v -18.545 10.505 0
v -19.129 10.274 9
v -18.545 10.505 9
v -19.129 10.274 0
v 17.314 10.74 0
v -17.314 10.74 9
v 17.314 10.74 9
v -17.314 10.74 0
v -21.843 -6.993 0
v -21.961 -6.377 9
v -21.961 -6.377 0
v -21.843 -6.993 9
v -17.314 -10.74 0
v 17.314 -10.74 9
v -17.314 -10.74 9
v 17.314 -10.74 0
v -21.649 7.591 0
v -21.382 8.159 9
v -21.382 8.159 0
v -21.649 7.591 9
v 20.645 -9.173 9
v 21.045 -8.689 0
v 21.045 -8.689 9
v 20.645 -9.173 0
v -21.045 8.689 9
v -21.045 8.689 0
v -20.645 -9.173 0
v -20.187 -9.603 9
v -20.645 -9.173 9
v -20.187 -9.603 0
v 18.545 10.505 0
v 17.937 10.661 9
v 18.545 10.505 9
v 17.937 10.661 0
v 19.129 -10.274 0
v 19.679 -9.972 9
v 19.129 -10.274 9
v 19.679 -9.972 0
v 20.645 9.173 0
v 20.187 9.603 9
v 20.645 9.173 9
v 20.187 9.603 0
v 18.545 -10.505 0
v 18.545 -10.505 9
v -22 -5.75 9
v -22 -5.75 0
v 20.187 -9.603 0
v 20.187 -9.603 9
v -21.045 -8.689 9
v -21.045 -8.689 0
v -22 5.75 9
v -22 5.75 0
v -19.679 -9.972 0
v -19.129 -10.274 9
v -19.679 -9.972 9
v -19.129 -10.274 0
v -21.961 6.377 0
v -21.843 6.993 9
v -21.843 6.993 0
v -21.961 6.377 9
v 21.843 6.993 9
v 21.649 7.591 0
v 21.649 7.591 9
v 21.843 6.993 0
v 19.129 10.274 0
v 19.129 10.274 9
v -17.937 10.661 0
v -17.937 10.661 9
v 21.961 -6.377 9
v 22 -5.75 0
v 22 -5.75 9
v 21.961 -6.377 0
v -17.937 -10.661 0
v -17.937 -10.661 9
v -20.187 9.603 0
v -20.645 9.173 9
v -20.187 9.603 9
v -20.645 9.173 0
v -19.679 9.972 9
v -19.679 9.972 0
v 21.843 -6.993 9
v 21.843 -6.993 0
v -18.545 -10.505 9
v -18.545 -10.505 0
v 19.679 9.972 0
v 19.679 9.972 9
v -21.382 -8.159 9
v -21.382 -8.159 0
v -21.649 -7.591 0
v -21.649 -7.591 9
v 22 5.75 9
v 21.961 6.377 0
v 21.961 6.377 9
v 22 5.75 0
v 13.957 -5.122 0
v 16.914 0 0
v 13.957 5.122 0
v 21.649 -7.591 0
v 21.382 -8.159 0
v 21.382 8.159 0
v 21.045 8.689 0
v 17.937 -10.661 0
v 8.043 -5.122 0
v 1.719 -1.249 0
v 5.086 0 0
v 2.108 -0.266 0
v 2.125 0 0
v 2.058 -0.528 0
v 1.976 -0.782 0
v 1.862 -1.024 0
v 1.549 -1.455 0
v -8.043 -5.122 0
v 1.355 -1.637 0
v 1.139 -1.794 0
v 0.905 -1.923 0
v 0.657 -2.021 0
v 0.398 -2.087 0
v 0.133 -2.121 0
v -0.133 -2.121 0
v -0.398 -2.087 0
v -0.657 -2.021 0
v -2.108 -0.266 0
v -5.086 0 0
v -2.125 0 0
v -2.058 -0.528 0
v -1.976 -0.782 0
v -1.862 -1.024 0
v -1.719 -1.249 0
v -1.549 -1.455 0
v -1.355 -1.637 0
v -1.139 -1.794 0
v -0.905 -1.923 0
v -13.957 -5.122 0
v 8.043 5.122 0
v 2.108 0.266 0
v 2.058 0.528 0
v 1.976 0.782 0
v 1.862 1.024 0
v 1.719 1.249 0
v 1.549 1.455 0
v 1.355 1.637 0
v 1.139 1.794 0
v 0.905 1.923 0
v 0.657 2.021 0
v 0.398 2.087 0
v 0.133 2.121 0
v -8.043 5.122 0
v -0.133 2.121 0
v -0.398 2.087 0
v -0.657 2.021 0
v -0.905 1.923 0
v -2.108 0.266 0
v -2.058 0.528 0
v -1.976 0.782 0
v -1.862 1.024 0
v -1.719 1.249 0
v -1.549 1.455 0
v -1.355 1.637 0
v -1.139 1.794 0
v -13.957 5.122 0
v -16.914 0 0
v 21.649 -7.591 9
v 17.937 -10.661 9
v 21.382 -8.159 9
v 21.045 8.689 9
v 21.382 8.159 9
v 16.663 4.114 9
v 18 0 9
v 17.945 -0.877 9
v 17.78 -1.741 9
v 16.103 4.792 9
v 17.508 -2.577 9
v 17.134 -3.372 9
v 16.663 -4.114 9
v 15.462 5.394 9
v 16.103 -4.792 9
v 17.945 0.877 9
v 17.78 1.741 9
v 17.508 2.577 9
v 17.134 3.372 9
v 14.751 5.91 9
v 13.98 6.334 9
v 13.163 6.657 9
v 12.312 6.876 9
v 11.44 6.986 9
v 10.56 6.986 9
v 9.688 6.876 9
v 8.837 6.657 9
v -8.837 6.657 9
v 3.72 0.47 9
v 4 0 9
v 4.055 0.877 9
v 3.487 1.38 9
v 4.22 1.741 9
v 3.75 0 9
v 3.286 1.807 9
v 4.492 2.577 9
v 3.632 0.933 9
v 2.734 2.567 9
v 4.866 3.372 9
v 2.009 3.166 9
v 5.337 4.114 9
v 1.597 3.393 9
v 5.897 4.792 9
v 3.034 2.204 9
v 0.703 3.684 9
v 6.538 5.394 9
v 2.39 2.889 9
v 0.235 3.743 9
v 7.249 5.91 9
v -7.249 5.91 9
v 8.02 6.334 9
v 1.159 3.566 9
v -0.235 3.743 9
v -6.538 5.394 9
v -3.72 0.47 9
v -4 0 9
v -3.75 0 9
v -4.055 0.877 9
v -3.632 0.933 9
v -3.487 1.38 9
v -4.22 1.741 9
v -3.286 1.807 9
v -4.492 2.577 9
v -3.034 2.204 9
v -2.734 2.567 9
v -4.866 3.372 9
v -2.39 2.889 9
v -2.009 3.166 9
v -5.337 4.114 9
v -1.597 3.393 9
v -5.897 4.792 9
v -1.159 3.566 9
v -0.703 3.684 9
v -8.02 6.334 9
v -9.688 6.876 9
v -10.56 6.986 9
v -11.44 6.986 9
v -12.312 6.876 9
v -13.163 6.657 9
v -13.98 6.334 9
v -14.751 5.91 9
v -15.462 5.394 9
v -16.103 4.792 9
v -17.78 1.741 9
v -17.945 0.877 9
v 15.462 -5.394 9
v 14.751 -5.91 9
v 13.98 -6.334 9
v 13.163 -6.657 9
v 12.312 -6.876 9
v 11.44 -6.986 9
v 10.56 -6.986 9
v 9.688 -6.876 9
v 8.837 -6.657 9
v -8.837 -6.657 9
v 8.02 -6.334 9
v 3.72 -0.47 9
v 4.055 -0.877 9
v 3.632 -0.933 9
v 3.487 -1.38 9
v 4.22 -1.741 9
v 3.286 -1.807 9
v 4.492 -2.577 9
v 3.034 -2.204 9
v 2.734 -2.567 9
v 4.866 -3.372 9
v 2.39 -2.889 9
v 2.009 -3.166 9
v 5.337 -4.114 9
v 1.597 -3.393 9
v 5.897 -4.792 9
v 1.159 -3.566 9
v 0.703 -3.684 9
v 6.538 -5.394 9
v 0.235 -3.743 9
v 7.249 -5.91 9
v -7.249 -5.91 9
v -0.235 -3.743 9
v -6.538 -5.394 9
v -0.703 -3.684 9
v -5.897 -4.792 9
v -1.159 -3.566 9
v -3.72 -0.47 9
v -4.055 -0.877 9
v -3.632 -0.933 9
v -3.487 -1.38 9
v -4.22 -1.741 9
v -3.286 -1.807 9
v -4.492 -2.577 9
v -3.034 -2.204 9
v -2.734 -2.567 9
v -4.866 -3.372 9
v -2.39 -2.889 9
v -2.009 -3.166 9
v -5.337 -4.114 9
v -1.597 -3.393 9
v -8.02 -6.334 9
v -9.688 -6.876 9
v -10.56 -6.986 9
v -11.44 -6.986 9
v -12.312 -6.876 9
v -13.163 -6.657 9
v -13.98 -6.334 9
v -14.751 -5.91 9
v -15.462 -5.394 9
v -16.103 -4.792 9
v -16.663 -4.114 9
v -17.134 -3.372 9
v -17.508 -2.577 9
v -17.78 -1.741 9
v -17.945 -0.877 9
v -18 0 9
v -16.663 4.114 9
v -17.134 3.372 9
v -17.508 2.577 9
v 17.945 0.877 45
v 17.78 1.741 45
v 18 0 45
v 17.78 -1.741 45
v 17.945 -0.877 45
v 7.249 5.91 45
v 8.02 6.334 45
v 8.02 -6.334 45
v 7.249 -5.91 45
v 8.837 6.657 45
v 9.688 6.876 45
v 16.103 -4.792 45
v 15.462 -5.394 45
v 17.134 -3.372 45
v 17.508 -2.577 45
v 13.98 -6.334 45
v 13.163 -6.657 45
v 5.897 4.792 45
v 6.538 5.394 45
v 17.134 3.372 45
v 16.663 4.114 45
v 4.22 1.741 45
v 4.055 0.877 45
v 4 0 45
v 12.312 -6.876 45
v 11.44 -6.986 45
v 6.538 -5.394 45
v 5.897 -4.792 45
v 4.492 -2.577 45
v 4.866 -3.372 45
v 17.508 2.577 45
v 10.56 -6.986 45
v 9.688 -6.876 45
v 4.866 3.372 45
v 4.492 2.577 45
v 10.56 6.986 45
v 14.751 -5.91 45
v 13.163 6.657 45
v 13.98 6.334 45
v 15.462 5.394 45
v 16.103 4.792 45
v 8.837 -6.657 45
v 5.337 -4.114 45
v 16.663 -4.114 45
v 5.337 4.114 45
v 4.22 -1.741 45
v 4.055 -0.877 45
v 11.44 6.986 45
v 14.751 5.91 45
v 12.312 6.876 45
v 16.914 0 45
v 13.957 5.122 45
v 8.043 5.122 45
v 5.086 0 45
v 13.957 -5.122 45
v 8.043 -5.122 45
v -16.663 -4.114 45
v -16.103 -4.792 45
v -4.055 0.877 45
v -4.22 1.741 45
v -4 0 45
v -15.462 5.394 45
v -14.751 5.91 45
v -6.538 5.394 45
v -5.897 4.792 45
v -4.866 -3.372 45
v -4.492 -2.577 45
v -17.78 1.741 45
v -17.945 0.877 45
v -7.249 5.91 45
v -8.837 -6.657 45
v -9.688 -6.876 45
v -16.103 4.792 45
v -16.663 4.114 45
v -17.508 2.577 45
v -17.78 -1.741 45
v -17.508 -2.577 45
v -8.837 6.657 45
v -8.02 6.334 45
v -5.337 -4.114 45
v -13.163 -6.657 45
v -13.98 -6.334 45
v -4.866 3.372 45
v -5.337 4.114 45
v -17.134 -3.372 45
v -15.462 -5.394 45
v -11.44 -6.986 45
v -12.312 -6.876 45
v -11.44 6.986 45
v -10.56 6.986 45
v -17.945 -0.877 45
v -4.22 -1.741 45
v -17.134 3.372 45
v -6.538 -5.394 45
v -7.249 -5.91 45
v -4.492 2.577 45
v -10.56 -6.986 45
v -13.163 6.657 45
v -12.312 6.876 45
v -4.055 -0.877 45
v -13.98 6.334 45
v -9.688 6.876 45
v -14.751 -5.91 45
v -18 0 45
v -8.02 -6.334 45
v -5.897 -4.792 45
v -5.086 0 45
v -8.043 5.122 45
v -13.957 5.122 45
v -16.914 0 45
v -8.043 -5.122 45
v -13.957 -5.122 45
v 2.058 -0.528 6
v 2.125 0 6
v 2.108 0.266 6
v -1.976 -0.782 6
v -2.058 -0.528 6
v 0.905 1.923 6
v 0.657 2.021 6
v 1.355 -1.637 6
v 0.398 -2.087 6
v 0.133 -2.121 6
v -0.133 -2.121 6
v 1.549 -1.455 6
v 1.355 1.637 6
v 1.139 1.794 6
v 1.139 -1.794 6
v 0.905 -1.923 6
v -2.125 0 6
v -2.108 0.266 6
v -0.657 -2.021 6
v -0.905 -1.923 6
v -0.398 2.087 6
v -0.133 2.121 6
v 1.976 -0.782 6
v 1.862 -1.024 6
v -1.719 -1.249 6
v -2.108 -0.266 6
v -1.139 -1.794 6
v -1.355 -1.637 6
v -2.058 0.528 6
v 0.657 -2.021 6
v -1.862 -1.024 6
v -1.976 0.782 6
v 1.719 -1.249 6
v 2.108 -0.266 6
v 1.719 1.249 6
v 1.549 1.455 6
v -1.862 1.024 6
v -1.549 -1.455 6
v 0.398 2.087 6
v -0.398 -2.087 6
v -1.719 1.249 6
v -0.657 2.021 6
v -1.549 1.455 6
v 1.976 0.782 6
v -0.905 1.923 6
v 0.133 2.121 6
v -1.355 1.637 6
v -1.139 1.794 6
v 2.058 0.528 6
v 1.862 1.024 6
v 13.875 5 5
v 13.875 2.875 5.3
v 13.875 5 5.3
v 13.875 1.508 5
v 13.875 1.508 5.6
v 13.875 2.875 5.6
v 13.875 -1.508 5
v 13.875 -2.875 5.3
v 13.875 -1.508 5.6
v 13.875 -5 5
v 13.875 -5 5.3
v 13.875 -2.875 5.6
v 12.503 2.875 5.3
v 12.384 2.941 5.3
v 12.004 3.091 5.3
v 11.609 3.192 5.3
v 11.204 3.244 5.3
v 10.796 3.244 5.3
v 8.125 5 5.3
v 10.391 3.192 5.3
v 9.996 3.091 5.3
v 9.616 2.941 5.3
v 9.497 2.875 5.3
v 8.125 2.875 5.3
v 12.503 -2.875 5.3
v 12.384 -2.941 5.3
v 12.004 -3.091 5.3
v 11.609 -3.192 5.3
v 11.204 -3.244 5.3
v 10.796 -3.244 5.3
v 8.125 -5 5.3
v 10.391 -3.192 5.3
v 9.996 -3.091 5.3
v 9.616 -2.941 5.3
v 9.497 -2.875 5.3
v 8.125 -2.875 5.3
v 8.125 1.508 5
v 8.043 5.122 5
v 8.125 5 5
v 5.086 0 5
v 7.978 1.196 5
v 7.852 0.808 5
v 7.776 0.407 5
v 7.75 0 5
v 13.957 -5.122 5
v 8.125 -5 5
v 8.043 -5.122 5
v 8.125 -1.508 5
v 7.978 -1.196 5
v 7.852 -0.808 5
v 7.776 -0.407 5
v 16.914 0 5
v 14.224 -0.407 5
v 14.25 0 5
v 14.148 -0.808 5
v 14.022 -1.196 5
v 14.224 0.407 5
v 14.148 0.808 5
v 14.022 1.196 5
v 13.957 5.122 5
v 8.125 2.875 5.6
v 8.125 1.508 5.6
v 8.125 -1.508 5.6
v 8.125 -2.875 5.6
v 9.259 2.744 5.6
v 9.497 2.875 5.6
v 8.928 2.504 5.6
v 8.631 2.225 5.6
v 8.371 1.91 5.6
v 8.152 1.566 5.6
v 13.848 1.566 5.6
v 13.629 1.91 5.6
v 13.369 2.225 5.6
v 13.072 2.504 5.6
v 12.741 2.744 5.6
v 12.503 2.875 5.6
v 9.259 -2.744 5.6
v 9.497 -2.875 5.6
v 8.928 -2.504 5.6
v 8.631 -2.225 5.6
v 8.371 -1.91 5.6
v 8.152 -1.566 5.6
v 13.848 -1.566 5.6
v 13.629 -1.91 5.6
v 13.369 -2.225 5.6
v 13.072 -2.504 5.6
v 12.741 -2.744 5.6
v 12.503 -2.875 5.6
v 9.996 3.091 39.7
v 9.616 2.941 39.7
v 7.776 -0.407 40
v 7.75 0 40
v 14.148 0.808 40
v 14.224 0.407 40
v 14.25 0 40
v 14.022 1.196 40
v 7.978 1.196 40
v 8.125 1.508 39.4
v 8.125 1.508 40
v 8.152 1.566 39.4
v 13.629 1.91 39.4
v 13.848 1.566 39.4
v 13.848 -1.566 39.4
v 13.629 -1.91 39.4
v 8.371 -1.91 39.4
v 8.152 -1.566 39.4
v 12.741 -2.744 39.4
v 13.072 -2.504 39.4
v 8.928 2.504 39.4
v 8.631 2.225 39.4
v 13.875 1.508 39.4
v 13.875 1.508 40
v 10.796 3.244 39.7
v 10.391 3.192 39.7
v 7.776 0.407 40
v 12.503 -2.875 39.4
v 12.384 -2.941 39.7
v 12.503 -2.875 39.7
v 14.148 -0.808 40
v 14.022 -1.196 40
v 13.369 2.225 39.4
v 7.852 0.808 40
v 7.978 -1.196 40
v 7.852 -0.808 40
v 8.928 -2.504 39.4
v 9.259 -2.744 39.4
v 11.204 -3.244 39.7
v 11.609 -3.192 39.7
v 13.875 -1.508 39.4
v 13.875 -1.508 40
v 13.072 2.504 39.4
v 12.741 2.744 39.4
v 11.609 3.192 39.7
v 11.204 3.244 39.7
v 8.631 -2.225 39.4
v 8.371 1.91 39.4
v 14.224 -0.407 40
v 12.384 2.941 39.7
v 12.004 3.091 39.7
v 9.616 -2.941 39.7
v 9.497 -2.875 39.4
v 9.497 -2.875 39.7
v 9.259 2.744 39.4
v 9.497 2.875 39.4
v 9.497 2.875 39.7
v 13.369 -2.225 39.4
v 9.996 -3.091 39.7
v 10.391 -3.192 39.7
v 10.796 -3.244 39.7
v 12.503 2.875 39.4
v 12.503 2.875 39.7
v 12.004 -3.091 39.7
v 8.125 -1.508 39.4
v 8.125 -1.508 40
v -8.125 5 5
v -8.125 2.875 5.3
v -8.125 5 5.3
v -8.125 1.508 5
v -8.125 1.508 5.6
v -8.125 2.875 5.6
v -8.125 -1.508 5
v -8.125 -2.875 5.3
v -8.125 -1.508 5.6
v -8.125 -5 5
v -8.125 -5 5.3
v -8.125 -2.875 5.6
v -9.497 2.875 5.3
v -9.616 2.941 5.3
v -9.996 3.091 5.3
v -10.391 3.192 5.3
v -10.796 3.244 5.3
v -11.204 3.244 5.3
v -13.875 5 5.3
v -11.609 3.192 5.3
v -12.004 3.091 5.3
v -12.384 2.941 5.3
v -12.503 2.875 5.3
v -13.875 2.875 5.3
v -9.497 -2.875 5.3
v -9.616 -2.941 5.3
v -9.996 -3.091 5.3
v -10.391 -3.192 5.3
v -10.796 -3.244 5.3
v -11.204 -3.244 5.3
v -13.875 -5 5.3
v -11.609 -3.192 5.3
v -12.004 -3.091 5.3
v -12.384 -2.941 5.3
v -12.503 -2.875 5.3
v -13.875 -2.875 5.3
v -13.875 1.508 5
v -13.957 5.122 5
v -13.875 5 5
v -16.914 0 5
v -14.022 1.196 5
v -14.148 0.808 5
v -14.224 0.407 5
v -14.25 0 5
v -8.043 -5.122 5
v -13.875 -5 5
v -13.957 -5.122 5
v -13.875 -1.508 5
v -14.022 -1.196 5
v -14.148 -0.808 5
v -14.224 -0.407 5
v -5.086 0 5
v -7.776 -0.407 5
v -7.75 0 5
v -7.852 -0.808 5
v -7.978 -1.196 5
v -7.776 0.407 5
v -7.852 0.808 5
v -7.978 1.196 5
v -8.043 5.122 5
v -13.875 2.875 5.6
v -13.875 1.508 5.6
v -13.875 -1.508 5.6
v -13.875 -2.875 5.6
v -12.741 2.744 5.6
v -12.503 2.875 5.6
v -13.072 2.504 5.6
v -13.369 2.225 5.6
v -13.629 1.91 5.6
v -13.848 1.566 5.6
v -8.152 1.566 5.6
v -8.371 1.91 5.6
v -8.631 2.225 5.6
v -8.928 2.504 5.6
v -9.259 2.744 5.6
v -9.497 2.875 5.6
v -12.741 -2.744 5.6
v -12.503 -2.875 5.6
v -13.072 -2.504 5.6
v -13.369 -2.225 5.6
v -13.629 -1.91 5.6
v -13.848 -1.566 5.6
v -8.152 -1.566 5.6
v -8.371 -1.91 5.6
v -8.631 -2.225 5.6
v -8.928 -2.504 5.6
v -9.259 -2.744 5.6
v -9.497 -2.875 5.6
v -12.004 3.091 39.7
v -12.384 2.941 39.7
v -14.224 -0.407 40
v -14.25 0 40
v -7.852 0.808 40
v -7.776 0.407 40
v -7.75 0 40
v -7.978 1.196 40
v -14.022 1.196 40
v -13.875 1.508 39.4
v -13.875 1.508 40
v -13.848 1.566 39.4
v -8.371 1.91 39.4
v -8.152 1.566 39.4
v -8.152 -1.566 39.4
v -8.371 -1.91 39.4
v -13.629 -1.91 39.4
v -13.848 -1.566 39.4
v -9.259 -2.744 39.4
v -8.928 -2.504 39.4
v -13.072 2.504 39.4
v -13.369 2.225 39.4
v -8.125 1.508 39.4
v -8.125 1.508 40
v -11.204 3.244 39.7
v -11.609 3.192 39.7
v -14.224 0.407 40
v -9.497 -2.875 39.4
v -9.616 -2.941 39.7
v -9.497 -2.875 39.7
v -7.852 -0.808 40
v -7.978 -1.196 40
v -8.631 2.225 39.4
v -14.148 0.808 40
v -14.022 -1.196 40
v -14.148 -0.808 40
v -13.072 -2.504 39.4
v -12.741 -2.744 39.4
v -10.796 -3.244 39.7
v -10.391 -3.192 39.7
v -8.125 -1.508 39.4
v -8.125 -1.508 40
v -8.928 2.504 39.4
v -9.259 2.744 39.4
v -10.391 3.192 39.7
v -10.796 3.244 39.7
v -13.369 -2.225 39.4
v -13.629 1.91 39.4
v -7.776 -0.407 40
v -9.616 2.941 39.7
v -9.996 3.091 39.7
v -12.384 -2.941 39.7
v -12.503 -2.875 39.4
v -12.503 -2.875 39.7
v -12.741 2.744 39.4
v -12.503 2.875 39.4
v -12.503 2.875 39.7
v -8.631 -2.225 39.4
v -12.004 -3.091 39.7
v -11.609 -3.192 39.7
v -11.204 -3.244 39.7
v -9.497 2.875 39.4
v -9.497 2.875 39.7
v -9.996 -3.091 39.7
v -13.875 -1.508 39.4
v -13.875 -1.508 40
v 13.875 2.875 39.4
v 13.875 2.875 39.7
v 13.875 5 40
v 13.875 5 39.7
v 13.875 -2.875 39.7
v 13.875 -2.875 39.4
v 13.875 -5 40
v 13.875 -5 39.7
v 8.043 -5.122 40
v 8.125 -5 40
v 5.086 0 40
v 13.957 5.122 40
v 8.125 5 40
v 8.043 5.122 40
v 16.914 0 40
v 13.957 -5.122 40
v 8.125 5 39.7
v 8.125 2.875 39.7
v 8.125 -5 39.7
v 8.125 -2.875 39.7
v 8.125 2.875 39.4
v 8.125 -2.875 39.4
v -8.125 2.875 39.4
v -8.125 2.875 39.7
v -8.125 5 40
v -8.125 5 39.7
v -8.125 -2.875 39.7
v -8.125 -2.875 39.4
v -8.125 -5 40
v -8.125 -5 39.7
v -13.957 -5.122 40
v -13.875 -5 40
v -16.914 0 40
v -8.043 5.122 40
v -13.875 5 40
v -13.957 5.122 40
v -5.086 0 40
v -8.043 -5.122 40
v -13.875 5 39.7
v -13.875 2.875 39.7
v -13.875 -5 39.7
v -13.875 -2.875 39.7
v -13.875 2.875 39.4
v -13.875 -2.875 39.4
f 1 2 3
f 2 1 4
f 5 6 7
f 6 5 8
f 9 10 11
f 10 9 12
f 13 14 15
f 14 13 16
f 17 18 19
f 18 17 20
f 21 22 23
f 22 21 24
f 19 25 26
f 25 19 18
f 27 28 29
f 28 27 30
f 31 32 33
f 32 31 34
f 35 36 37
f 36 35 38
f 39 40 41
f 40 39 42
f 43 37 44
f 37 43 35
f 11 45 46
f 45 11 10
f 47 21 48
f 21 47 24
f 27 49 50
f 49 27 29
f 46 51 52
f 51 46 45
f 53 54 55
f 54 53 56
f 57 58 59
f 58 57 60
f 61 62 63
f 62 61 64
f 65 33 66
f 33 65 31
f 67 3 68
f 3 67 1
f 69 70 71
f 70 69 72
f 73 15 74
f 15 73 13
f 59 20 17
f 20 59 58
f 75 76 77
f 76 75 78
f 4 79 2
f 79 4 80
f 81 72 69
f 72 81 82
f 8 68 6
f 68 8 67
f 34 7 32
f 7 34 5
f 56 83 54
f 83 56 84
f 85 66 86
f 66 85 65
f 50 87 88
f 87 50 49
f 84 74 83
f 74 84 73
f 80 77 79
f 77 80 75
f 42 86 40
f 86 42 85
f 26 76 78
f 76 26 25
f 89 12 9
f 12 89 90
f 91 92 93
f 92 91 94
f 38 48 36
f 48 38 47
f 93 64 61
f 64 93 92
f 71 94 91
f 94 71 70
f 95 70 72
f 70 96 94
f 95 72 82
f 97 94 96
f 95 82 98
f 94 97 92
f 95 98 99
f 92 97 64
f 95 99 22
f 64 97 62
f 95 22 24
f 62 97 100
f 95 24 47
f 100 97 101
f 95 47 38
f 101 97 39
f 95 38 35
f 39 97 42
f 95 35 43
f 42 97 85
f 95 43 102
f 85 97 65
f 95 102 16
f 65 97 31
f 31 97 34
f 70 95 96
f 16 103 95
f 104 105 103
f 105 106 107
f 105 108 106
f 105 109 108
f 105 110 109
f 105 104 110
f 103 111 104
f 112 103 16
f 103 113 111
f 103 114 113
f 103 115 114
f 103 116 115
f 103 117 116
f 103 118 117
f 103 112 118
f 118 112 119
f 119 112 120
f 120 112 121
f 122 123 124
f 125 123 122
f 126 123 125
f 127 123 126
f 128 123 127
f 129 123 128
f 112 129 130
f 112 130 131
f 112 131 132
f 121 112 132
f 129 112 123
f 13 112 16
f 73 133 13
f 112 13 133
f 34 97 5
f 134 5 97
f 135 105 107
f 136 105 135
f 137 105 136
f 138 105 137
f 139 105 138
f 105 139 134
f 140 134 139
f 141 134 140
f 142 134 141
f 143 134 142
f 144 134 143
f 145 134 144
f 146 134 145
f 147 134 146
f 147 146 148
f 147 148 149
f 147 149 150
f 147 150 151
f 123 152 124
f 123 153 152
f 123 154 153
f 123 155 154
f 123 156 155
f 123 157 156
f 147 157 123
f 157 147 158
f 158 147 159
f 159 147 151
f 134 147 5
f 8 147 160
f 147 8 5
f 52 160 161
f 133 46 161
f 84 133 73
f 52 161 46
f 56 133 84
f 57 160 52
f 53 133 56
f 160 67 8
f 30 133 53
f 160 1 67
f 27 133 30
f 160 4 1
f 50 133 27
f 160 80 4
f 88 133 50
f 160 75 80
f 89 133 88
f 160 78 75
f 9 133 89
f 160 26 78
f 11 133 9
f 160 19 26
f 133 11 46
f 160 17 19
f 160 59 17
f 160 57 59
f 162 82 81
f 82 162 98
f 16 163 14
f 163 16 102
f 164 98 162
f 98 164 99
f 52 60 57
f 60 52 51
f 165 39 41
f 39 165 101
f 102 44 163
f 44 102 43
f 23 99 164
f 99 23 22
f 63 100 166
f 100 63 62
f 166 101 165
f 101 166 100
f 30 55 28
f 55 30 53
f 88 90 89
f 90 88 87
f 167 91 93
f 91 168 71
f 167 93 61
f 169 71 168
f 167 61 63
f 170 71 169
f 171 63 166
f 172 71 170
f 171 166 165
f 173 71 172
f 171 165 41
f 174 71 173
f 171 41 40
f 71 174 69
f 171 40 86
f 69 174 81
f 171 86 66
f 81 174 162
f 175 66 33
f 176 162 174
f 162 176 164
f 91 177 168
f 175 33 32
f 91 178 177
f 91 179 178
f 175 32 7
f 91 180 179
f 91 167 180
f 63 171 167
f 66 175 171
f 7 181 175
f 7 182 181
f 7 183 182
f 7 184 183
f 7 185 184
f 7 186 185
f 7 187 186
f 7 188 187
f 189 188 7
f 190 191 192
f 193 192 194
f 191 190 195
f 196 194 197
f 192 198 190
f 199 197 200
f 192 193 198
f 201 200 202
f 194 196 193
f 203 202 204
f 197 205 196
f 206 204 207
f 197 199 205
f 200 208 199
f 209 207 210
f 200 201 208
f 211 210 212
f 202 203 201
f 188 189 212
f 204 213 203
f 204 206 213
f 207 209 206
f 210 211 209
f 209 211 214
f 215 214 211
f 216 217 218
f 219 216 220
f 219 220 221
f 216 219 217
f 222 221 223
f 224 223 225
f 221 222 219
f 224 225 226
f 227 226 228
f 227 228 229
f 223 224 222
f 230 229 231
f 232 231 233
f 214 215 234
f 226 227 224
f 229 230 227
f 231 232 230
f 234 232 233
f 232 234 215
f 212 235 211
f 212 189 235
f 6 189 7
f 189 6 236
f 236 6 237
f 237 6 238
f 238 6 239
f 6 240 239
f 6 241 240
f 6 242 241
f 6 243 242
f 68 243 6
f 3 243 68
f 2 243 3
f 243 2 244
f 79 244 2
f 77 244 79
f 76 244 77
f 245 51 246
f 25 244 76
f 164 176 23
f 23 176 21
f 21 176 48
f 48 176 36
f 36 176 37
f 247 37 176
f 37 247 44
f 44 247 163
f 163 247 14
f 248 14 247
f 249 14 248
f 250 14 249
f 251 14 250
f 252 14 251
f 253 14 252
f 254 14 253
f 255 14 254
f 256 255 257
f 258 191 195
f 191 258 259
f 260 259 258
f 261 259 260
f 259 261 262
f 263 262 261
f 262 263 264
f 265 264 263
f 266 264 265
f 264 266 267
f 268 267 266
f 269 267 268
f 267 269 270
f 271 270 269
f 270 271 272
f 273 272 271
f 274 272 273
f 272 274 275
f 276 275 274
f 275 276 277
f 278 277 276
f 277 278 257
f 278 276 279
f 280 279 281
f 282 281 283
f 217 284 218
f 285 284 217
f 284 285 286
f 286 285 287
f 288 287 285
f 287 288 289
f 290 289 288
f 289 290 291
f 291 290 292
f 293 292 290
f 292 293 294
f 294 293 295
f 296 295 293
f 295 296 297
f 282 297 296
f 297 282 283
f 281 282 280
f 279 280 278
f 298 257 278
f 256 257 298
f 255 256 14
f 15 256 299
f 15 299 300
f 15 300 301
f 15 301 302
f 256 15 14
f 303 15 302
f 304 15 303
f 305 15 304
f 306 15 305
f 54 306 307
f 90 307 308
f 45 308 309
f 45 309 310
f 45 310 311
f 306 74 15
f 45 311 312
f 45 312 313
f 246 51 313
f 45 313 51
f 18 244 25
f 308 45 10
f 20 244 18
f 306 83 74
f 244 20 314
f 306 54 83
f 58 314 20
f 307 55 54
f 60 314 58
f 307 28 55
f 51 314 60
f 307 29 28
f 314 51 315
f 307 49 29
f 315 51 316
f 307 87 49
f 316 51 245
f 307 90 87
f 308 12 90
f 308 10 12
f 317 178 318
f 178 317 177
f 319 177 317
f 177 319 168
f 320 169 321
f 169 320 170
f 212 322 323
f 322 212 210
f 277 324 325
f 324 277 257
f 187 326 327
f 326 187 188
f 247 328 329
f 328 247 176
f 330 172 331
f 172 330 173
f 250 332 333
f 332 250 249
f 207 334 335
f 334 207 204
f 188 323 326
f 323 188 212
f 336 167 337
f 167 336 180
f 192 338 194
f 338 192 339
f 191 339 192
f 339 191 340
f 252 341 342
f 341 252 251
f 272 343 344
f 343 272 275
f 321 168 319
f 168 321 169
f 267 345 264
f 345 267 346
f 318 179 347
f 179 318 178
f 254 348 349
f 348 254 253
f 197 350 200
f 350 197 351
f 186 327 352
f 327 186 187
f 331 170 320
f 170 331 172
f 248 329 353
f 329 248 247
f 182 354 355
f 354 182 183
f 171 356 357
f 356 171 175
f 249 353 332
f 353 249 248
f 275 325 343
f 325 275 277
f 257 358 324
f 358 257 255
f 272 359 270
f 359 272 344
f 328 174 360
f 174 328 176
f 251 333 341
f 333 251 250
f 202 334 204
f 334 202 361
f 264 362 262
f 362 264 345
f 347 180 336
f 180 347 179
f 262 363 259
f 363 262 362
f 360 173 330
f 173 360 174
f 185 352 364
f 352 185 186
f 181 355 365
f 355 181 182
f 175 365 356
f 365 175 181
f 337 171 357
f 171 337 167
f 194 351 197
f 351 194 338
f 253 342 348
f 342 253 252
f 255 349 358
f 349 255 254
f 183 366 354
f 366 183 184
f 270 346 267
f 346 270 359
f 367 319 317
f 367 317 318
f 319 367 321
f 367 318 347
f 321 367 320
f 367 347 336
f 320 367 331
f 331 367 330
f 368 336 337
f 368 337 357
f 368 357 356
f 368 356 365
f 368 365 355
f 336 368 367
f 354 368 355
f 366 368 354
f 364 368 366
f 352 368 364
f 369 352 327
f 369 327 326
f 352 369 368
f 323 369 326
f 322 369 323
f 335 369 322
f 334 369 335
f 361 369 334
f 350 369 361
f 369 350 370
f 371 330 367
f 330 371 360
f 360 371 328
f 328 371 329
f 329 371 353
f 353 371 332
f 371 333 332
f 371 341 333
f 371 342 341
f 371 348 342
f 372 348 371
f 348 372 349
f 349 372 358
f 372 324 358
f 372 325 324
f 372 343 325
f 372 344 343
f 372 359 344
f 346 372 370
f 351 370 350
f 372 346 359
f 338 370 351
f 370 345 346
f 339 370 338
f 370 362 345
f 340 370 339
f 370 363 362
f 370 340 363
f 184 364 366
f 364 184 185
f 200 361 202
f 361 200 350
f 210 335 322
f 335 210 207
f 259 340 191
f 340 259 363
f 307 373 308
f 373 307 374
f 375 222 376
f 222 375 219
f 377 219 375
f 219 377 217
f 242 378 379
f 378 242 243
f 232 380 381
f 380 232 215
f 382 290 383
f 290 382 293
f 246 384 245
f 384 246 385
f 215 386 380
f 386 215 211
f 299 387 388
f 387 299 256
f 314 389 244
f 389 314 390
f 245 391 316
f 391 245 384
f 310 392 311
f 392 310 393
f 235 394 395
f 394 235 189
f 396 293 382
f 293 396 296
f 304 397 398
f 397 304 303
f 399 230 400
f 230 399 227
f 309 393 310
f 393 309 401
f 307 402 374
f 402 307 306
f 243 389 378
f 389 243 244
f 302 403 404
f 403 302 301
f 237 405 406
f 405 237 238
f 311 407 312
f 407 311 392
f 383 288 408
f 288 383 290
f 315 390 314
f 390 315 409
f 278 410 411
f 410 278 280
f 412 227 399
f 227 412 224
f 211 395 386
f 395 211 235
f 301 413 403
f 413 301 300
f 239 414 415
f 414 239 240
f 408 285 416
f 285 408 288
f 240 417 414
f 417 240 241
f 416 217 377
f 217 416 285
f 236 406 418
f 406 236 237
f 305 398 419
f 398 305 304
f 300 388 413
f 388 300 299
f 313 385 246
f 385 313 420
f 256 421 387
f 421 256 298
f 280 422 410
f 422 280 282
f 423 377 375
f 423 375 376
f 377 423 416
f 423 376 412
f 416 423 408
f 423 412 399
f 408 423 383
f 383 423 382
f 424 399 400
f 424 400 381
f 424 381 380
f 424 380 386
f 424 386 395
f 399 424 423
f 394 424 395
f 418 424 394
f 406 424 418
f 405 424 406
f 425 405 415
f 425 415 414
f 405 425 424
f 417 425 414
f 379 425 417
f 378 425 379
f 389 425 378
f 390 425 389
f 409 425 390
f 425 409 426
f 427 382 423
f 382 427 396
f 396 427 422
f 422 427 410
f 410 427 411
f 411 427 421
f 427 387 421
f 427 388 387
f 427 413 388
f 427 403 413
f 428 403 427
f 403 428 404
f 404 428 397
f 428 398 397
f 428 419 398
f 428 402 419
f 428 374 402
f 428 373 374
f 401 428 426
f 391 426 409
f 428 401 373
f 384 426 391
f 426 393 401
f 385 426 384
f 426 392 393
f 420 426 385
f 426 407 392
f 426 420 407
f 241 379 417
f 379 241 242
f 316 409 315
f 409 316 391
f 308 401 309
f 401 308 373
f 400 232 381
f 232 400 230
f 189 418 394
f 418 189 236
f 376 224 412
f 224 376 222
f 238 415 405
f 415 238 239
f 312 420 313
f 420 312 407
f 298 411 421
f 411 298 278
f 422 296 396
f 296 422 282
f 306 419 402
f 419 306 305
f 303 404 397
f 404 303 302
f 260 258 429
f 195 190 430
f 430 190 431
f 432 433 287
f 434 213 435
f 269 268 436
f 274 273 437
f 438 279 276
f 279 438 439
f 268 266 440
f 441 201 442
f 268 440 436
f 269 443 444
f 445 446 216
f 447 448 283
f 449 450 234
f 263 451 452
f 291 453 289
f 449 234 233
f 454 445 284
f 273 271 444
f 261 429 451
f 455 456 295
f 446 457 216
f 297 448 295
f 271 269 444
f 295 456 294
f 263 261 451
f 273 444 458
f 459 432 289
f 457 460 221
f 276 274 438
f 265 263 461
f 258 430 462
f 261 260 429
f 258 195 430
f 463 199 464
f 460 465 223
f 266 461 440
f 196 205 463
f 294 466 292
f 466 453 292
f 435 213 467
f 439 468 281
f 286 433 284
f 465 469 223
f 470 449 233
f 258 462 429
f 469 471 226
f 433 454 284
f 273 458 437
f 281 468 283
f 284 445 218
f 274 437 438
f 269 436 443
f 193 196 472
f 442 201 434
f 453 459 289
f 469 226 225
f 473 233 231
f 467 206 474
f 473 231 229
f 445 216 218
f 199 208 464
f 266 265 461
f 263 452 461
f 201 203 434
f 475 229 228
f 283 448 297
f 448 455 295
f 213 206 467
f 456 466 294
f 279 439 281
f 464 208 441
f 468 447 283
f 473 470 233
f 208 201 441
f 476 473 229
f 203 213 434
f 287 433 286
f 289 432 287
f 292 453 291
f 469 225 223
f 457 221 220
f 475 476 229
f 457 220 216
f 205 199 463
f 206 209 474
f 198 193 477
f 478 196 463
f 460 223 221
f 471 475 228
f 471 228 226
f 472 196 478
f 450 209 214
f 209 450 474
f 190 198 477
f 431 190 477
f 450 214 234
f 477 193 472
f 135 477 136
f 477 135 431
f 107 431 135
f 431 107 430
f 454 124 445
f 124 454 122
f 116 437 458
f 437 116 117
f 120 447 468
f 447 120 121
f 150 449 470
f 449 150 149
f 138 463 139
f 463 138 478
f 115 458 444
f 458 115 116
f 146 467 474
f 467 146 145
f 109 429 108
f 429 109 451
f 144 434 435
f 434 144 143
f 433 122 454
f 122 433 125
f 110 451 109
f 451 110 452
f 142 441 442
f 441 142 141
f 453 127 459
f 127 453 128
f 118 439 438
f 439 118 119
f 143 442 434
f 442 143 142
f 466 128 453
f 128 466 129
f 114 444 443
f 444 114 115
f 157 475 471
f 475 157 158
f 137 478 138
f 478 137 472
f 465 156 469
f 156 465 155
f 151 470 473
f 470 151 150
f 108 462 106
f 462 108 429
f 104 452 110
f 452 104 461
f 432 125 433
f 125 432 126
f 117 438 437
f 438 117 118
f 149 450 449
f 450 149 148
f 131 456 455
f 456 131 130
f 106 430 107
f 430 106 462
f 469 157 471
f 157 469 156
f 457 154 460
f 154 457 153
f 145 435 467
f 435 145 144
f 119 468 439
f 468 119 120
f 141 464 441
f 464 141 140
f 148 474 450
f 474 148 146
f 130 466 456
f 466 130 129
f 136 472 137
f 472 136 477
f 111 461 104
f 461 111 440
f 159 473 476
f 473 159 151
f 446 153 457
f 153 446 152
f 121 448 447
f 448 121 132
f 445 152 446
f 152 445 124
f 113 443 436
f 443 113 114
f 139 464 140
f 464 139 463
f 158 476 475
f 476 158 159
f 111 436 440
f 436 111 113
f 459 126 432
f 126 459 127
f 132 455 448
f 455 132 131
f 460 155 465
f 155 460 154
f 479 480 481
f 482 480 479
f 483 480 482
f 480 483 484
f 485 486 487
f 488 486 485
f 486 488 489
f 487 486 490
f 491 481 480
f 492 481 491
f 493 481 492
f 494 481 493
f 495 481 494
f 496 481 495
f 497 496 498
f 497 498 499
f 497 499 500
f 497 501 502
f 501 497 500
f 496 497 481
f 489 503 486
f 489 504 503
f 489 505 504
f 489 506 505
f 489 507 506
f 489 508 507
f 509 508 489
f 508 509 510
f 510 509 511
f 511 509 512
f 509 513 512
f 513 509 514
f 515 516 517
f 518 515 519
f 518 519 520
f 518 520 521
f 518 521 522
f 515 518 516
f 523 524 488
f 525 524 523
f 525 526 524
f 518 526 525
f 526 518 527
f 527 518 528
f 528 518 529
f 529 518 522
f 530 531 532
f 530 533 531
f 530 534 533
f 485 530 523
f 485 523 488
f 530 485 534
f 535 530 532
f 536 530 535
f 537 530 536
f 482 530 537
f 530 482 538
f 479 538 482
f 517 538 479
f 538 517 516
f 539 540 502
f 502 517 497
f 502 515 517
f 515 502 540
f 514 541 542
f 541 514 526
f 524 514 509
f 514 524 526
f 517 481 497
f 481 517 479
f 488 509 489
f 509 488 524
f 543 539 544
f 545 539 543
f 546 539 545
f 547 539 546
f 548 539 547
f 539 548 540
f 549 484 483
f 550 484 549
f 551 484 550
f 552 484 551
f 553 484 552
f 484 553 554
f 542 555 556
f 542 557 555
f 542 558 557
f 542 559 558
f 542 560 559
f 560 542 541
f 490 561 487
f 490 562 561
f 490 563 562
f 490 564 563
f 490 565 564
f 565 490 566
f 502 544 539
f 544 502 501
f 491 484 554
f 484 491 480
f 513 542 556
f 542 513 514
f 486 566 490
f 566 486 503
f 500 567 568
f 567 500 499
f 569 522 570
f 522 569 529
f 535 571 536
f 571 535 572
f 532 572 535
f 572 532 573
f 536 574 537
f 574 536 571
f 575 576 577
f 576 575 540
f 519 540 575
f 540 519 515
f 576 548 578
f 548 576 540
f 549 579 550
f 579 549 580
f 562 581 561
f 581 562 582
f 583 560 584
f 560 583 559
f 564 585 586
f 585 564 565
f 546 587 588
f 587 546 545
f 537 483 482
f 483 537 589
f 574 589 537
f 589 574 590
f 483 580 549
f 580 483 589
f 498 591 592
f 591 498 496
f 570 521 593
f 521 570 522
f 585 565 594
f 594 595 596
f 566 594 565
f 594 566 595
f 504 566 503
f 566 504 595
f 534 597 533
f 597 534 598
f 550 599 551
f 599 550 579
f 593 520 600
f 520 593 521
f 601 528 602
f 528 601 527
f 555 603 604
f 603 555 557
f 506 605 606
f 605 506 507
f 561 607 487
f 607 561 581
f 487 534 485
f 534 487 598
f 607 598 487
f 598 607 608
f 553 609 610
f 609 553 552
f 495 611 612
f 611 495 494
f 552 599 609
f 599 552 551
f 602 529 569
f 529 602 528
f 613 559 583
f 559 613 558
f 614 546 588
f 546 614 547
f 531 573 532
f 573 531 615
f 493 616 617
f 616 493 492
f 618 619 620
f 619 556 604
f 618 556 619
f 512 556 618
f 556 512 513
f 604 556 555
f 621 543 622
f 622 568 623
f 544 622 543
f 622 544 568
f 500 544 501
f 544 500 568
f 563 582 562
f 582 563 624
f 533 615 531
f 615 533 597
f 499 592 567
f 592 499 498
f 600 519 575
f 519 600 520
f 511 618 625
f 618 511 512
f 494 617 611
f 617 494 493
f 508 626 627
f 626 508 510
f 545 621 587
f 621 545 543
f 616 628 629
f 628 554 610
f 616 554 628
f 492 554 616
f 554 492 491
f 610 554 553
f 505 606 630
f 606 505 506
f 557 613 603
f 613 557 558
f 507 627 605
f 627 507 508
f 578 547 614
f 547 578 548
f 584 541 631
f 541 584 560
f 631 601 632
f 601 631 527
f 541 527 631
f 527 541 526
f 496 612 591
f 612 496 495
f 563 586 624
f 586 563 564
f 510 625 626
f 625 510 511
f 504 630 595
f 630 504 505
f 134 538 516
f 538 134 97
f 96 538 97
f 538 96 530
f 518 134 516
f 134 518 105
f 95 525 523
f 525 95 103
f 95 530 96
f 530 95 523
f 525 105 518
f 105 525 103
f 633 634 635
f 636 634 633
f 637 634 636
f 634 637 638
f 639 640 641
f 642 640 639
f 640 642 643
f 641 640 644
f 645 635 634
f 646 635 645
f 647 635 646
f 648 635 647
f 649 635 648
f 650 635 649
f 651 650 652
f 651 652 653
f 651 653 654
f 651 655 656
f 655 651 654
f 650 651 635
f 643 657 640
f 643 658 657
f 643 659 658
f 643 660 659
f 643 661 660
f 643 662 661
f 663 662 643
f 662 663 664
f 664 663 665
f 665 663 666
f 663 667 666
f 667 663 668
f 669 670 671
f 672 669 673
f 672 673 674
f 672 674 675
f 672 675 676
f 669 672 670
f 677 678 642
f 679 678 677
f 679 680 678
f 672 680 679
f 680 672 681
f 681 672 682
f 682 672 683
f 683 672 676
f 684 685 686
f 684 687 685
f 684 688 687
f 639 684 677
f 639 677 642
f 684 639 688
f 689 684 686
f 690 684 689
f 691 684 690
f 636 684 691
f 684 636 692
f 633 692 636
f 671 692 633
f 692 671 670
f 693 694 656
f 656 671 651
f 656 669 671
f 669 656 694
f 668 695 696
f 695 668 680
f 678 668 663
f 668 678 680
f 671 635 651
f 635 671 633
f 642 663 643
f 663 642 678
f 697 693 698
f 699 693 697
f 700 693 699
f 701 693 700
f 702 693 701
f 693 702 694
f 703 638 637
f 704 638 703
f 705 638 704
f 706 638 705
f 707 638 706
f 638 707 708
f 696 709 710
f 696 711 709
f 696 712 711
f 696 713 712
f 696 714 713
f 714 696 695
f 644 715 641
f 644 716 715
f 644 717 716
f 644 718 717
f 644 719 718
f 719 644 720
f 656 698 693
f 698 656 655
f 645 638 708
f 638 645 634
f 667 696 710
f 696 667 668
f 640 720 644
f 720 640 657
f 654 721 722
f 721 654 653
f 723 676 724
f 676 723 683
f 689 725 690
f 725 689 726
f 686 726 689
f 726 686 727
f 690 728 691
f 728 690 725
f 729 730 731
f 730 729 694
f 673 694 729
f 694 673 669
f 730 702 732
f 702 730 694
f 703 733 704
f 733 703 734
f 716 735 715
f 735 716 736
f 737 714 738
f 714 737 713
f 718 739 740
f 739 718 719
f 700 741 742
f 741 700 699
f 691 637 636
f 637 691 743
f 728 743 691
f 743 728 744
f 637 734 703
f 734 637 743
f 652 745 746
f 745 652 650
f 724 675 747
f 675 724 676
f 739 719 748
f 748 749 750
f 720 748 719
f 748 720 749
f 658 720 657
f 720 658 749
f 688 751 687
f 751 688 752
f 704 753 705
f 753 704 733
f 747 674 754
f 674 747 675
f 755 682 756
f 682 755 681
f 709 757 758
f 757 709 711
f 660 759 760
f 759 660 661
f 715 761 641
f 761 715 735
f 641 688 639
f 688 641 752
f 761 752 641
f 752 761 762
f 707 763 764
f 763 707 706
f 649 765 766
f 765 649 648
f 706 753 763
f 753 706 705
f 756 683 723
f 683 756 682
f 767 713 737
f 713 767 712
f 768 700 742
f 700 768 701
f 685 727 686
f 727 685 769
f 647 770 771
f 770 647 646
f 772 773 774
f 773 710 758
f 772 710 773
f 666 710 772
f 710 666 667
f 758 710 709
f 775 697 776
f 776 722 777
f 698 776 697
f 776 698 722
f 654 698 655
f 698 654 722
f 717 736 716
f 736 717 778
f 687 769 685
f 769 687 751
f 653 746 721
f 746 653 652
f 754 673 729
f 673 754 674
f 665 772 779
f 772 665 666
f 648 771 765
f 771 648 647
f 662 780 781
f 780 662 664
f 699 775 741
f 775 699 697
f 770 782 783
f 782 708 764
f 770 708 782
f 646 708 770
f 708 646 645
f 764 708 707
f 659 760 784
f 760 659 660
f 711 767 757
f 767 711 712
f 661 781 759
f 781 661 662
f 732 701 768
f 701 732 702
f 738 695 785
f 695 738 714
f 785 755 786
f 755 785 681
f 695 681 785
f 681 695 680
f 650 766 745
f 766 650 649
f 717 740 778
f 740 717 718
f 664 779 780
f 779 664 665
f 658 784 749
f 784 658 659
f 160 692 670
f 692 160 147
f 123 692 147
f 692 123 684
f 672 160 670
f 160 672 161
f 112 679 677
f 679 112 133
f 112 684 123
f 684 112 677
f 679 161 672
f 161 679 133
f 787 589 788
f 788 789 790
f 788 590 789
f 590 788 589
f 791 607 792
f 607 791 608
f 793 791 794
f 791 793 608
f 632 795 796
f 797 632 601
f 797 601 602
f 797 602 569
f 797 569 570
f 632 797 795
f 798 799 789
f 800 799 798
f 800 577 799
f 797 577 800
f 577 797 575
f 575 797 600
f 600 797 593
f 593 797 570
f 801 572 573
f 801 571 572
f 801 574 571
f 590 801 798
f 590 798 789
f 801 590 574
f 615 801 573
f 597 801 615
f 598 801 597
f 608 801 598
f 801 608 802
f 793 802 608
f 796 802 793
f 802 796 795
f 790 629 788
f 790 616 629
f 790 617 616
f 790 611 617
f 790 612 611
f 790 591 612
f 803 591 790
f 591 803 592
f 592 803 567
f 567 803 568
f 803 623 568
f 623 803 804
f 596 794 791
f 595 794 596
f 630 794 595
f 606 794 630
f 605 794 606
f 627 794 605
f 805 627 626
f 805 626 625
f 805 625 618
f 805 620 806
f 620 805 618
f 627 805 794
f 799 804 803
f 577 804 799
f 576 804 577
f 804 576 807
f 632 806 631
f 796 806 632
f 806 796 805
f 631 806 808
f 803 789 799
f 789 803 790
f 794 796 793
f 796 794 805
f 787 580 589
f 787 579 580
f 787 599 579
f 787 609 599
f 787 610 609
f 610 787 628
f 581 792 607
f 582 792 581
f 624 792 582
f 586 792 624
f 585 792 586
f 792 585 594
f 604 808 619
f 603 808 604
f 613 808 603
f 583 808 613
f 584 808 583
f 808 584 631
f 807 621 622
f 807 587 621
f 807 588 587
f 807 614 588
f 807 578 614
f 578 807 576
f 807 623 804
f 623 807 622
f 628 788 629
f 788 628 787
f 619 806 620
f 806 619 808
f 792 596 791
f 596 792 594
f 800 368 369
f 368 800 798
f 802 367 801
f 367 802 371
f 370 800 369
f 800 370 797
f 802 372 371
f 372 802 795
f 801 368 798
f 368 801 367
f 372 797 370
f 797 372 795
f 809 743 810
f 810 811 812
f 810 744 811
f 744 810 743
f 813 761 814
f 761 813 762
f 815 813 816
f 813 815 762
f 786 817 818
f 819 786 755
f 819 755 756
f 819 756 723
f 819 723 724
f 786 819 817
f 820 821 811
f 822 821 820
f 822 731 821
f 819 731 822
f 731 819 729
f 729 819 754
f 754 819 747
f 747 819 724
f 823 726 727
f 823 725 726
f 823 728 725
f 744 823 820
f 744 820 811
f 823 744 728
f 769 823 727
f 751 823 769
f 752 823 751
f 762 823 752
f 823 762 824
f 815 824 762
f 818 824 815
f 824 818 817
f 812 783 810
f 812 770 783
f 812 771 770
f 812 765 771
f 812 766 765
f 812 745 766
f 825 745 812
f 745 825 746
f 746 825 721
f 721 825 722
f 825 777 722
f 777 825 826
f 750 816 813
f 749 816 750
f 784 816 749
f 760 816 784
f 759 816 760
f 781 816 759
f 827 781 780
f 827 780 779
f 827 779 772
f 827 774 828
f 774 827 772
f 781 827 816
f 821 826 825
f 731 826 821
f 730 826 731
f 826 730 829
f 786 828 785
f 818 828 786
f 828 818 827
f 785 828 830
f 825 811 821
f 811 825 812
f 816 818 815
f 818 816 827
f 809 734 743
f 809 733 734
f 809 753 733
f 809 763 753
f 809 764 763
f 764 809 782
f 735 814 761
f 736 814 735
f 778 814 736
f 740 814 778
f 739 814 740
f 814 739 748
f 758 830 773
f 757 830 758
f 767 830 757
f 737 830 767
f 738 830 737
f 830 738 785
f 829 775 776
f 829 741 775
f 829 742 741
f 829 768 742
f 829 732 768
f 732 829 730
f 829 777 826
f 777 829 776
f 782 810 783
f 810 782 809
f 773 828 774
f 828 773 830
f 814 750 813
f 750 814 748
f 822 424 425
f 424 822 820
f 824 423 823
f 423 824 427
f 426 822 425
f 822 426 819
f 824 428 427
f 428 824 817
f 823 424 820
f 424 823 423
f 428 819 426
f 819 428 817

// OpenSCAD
$fn = 50;


difference() {
	union() {
		hull() {
			translate(v = [-17.0000000000, 5.7500000000, 0]) {
				cylinder(h = 9, r = 5);
			}
			translate(v = [17.0000000000, 5.7500000000, 0]) {
				cylinder(h = 9, r = 5);
			}
			translate(v = [-17.0000000000, -5.7500000000, 0]) {
				cylinder(h = 9, r = 5);
			}
			translate(v = [17.0000000000, -5.7500000000, 0]) {
				cylinder(h = 9, r = 5);
			}
		}
		translate(v = [11.0000000000, 0, 0.0000000000]) {
			cylinder(h = 45, r = 7.0000000000);
		}
		translate(v = [-11.0000000000, 0, 0.0000000000]) {
			cylinder(h = 45, r = 7.0000000000);
		}
	}
	union() {
		translate(v = [0, 0, 9]) {
			rotate(a = [0, 0, 0]) {
				difference() {
					union() {
						#translate(v = [0, 0, -40.0000000000]) {
							cylinder(h = 40, r = 2.0000000000);
						}
						#translate(v = [0, 0, -3]) {
							cylinder(h = 3, r1 = 2.1250000000, r2 = 3.7500000000);
						}
						#translate(v = [0, 0, -40.0000000000]) {
							cylinder(h = 40, r = 2.1250000000);
						}
						#translate(v = [0, 0, -40.0000000000]) {
							cylinder(h = 40, r = 2.0000000000);
						}
					}
					union();
				}
			}
		}
		translate(v = [11.0000000000, 0, 0]) {
			rotate(a = [0, 0, 0]) {
				difference() {
					union() {
						#translate(v = [-2.8750000000, -5.0000000000, -0.3000000000]) {
							cube(size = [5.7500000000, 10, 0.3000000000]);
						}
						#translate(v = [-2.8750000000, -2.8750000000, -0.6000000000]) {
							cube(size = [5.7500000000, 5.7500000000, 0.3000000000]);
						}
						#translate(v = [-2.8750000000, -5.0000000000, 5]) {
							cube(size = [5.7500000000, 10, 0.3000000000]);
						}
						#translate(v = [-2.8750000000, -2.8750000000, 5.3000000000]) {
							cube(size = [5.7500000000, 5.7500000000, 0.3000000000]);
						}
						#translate(v = [0, 0, -100.0000000000]) {
							cylinder(h = 200, r = 3.2500000000);
						}
						#linear_extrude(height = 5) {
							polygon(points = [[5.9142500000, 0.0000000000], [2.9571250000, 5.1218907443], [-2.9571250000, 5.1218907443], [-5.9142500000, 0.0000000000], [-2.9571250000, -5.1218907443], [2.9571250000, -5.1218907443]]);
						}
						#translate(v = [-2.8750000000, -5.0000000000, -0.3000000000]) {
							cube(size = [5.7500000000, 10, 0.3000000000]);
						}
						#translate(v = [-2.8750000000, -2.8750000000, -0.6000000000]) {
							cube(size = [5.7500000000, 5.7500000000, 0.3000000000]);
						}
						#translate(v = [-2.8750000000, -5.0000000000, 5]) {
							cube(size = [5.7500000000, 10, 0.3000000000]);
						}
						#translate(v = [-2.8750000000, -2.8750000000, 5.3000000000]) {
							cube(size = [5.7500000000, 5.7500000000, 0.3000000000]);
						}
						#translate(v = [0, 0, -100.0000000000]) {
							cylinder(h = 200, r = 3.2500000000);
						}
						#translate(v = [-2.8750000000, -5.0000000000, -0.3000000000]) {
							cube(size = [5.7500000000, 10, 0.3000000000]);
						}
						#translate(v = [-2.8750000000, -2.8750000000, -0.6000000000]) {
							cube(size = [5.7500000000, 5.7500000000, 0.3000000000]);
						}
						#translate(v = [-2.8750000000, -5.0000000000, 5]) {
							cube(size = [5.7500000000, 10, 0.3000000000]);
						}
						#translate(v = [-2.8750000000, -2.8750000000, 5.3000000000]) {
							cube(size = [5.7500000000, 5.7500000000, 0.3000000000]);
						}
						#translate(v = [0, 0, -100.0000000000]) {
							cylinder(h = 200, r = 3.2500000000);
						}
					}
					union();
				}
			}
		}
		translate(v = [-11.0000000000, 0, 0]) {
			rotate(a = [0, 0, 0]) {
				difference() {
					union() {
						#translate(v = [-2.8750000000, -5.0000000000, -0.3000000000]) {
							cube(size = [5.7500000000, 10, 0.3000000000]);
						}
						#translate(v = [-2.8750000000, -2.8750000000, -0.6000000000]) {
							cube(size = [5.7500000000, 5.7500000000, 0.3000000000]);
						}
						#translate(v = [-2.8750000000, -5.0000000000, 5]) {
							cube(size = [5.7500000000, 10, 0.3000000000]);
						}
						#translate(v = [-2.8750000000, -2.8750000000, 5.3000000000]) {
							cube(size = [5.7500000000, 5.7500000000, 0.3000000000]);
						}
						#translate(v = [0, 0, -100.0000000000]) {
							cylinder(h = 200, r = 3.2500000000);
						}
						#linear_extrude(height = 5) {
							polygon(points = [[5.9142500000, 0.0000000000], [2.9571250000, 5.1218907443], [-2.9571250000, 5.1218907443], [-5.9142500000, 0.0000000000], [-2.9571250000, -5.1218907443], [2.9571250000, -5.1218907443]]);
						}
						#translate(v = [-2.8750000000, -5.0000000000, -0.3000000000]) {
							cube(size = [5.7500000000, 10, 0.3000000000]);
						}
						#translate(v = [-2.8750000000, -2.8750000000, -0.6000000000]) {
							cube(size = [5.7500000000, 5.7500000000, 0.3000000000]);
						}
						#translate(v = [-2.8750000000, -5.0000000000, 5]) {
							cube(size = [5.7500000000, 10, 0.3000000000]);
						}
						#translate(v = [-2.8750000000, -2.8750000000, 5.3000000000]) {
							cube(size = [5.7500000000, 5.7500000000, 0.3000000000]);
						}
						#translate(v = [0, 0, -100.0000000000]) {
							cylinder(h = 200, r = 3.2500000000);
						}
						#translate(v = [-2.8750000000, -5.0000000000, -0.3000000000]) {
							cube(size = [5.7500000000, 10, 0.3000000000]);
						}
						#translate(v = [-2.8750000000, -2.8750000000, -0.6000000000]) {
							cube(size = [5.7500000000, 5.7500000000, 0.3000000000]);
						}
						#translate(v = [-2.8750000000, -5.0000000000, 5]) {
							cube(size = [5.7500000000, 10, 0.3000000000]);
						}
						#translate(v = [-2.8750000000, -2.8750000000, 5.3000000000]) {
							cube(size = [5.7500000000, 5.7500000000, 0.3000000000]);
						}
						#translate(v = [0, 0, -100.0000000000]) {
							cylinder(h = 200, r = 3.2500000000);
						}
					}
					union();
				}
			}
		}
		translate(v = [11.0000000000, 0, 45]) {
			rotate(a = [0, 0, 0]) {
				difference() {
					union() {
						#translate(v = [-2.8750000000, -5.0000000000, -5.3000000000]) {
							cube(size = [5.7500000000, 10, 0.3000000000]);
						}
						#translate(v = [-2.8750000000, -2.8750000000, -5.6000000000]) {
							cube(size = [5.7500000000, 5.7500000000, 0.3000000000]);
						}
						#translate(v = [-2.8750000000, -5.0000000000, 0]) {
							cube(size = [5.7500000000, 10, 0.3000000000]);
						}
						#translate(v = [-2.8750000000, -2.8750000000, 0.3000000000]) {
							cube(size = [5.7500000000, 5.7500000000, 0.3000000000]);
						}
						#translate(v = [0, 0, -100.0000000000]) {
							cylinder(h = 200, r = 3.2500000000);
						}
						translate(v = [0, 0, -5]) {
							#linear_extrude(height = 5) {
								polygon(points = [[5.9142500000, 0.0000000000], [2.9571250000, 5.1218907443], [-2.9571250000, 5.1218907443], [-5.9142500000, 0.0000000000], [-2.9571250000, -5.1218907443], [2.9571250000, -5.1218907443]]);
							}
						}
						#translate(v = [-2.8750000000, -5.0000000000, -5.3000000000]) {
							cube(size = [5.7500000000, 10, 0.3000000000]);
						}
						#translate(v = [-2.8750000000, -2.8750000000, -5.6000000000]) {
							cube(size = [5.7500000000, 5.7500000000, 0.3000000000]);
						}
						#translate(v = [-2.8750000000, -5.0000000000, 0]) {
							cube(size = [5.7500000000, 10, 0.3000000000]);
						}
						#translate(v = [-2.8750000000, -2.8750000000, 0.3000000000]) {
							cube(size = [5.7500000000, 5.7500000000, 0.3000000000]);
						}
						#translate(v = [0, 0, -100.0000000000]) {
							cylinder(h = 200, r = 3.2500000000);
						}
						#translate(v = [-2.8750000000, -5.0000000000, -5.3000000000]) {
							cube(size = [5.7500000000, 10, 0.3000000000]);
						}
						#translate(v = [-2.8750000000, -2.8750000000, -5.6000000000]) {
							cube(size = [5.7500000000, 5.7500000000, 0.3000000000]);
						}
						#translate(v = [-2.8750000000, -5.0000000000, 0]) {
							cube(size = [5.7500000000, 10, 0.3000000000]);
						}
						#translate(v = [-2.8750000000, -2.8750000000, 0.3000000000]) {
							cube(size = [5.7500000000, 5.7500000000, 0.3000000000]);
						}
						#translate(v = [0, 0, -100.0000000000]) {
							cylinder(h = 200, r = 3.2500000000);
						}
					}
					union();
				}
			}
		}
		translate(v = [-11.0000000000, 0, 45]) {
			rotate(a = [0, 0, 0]) {
				difference() {
					union() {
						#translate(v = [-2.8750000000, -5.0000000000, -5.3000000000]) {
							cube(size = [5.7500000000, 10, 0.3000000000]);
						}
						#translate(v = [-2.8750000000, -2.8750000000, -5.6000000000]) {
							cube(size = [5.7500000000, 5.7500000000, 0.3000000000]);
						}
						#translate(v = [-2.8750000000, -5.0000000000, 0]) {
							cube(size = [5.7500000000, 10, 0.3000000000]);
						}
						#translate(v = [-2.8750000000, -2.8750000000, 0.3000000000]) {
							cube(size = [5.7500000000, 5.7500000000, 0.3000000000]);
						}
						#translate(v = [0, 0, -100.0000000000]) {
							cylinder(h = 200, r = 3.2500000000);
						}
						translate(v = [0, 0, -5]) {
							#linear_extrude(height = 5) {
								polygon(points = [[5.9142500000, 0.0000000000], [2.9571250000, 5.1218907443], [-2.9571250000, 5.1218907443], [-5.9142500000, 0.0000000000], [-2.9571250000, -5.1218907443], [2.9571250000, -5.1218907443]]);
							}
						}
						#translate(v = [-2.8750000000, -5.0000000000, -5.3000000000]) {
							cube(size = [5.7500000000, 10, 0.3000000000]);
						}
						#translate(v = [-2.8750000000, -2.8750000000, -5.6000000000]) {
							cube(size = [5.7500000000, 5.7500000000, 0.3000000000]);
						}
						#translate(v = [-2.8750000000, -5.0000000000, 0]) {
							cube(size = [5.7500000000, 10, 0.3000000000]);
						}
						#translate(v = [-2.8750000000, -2.8750000000, 0.3000000000]) {
							cube(size = [5.7500000000, 5.7500000000, 0.3000000000]);
						}
						#translate(v = [0, 0, -100.0000000000]) {
							cylinder(h = 200, r = 3.2500000000);
						}
						#translate(v = [-2.8750000000, -5.0000000000, -5.3000000000]) {
							cube(size = [5.7500000000, 10, 0.3000000000]);
						}
						#translate(v = [-2.8750000000, -2.8750000000, -5.6000000000]) {
							cube(size = [5.7500000000, 5.7500000000, 0.3000000000]);
						}
						#translate(v = [-2.8750000000, -5.0000000000, 0]) {
							cube(size = [5.7500000000, 10, 0.3000000000]);
						}
						#translate(v = [-2.8750000000, -2.8750000000, 0.3000000000]) {
							cube(size = [5.7500000000, 5.7500000000, 0.3000000000]);
						}
						#translate(v = [0, 0, -100.0000000000]) {
							cylinder(h = 200, r = 3.2500000000);
						}
					}
					union();
				}
			}
		}
	}
}
